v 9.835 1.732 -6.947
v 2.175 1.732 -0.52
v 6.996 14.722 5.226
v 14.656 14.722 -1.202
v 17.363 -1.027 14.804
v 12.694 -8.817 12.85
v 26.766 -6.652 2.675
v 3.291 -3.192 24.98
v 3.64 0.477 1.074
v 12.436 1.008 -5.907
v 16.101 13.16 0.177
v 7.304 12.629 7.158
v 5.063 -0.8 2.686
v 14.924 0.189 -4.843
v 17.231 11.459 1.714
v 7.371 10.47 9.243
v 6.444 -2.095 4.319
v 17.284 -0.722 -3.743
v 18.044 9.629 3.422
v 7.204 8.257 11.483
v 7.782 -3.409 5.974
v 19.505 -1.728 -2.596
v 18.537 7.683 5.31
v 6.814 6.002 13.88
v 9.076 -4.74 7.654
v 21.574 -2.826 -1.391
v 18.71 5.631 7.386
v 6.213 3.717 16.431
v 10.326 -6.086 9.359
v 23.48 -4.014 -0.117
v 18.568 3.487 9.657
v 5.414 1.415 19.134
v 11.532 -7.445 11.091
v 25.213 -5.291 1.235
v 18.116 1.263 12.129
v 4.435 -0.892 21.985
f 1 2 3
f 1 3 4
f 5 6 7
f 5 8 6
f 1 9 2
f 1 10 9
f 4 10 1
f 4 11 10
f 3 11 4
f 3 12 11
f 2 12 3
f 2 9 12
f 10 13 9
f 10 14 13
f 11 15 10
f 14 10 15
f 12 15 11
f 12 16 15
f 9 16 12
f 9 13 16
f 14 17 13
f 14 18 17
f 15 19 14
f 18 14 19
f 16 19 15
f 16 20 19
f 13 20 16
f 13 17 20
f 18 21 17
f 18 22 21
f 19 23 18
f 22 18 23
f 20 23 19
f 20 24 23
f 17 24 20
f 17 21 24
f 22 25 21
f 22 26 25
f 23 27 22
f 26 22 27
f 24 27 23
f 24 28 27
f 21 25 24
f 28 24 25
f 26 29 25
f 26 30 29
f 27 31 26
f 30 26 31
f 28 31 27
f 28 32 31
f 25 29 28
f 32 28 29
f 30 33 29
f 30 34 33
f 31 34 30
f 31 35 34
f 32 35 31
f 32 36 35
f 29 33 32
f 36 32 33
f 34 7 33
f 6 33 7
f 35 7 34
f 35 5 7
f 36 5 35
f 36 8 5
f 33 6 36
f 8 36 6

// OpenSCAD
rotate([30, 40, 0])
linear_extrude(height=20, scale=[2,.5], twist=-30, slices=8) {
    translate([2,2,0]) square([10, 15]);
}
